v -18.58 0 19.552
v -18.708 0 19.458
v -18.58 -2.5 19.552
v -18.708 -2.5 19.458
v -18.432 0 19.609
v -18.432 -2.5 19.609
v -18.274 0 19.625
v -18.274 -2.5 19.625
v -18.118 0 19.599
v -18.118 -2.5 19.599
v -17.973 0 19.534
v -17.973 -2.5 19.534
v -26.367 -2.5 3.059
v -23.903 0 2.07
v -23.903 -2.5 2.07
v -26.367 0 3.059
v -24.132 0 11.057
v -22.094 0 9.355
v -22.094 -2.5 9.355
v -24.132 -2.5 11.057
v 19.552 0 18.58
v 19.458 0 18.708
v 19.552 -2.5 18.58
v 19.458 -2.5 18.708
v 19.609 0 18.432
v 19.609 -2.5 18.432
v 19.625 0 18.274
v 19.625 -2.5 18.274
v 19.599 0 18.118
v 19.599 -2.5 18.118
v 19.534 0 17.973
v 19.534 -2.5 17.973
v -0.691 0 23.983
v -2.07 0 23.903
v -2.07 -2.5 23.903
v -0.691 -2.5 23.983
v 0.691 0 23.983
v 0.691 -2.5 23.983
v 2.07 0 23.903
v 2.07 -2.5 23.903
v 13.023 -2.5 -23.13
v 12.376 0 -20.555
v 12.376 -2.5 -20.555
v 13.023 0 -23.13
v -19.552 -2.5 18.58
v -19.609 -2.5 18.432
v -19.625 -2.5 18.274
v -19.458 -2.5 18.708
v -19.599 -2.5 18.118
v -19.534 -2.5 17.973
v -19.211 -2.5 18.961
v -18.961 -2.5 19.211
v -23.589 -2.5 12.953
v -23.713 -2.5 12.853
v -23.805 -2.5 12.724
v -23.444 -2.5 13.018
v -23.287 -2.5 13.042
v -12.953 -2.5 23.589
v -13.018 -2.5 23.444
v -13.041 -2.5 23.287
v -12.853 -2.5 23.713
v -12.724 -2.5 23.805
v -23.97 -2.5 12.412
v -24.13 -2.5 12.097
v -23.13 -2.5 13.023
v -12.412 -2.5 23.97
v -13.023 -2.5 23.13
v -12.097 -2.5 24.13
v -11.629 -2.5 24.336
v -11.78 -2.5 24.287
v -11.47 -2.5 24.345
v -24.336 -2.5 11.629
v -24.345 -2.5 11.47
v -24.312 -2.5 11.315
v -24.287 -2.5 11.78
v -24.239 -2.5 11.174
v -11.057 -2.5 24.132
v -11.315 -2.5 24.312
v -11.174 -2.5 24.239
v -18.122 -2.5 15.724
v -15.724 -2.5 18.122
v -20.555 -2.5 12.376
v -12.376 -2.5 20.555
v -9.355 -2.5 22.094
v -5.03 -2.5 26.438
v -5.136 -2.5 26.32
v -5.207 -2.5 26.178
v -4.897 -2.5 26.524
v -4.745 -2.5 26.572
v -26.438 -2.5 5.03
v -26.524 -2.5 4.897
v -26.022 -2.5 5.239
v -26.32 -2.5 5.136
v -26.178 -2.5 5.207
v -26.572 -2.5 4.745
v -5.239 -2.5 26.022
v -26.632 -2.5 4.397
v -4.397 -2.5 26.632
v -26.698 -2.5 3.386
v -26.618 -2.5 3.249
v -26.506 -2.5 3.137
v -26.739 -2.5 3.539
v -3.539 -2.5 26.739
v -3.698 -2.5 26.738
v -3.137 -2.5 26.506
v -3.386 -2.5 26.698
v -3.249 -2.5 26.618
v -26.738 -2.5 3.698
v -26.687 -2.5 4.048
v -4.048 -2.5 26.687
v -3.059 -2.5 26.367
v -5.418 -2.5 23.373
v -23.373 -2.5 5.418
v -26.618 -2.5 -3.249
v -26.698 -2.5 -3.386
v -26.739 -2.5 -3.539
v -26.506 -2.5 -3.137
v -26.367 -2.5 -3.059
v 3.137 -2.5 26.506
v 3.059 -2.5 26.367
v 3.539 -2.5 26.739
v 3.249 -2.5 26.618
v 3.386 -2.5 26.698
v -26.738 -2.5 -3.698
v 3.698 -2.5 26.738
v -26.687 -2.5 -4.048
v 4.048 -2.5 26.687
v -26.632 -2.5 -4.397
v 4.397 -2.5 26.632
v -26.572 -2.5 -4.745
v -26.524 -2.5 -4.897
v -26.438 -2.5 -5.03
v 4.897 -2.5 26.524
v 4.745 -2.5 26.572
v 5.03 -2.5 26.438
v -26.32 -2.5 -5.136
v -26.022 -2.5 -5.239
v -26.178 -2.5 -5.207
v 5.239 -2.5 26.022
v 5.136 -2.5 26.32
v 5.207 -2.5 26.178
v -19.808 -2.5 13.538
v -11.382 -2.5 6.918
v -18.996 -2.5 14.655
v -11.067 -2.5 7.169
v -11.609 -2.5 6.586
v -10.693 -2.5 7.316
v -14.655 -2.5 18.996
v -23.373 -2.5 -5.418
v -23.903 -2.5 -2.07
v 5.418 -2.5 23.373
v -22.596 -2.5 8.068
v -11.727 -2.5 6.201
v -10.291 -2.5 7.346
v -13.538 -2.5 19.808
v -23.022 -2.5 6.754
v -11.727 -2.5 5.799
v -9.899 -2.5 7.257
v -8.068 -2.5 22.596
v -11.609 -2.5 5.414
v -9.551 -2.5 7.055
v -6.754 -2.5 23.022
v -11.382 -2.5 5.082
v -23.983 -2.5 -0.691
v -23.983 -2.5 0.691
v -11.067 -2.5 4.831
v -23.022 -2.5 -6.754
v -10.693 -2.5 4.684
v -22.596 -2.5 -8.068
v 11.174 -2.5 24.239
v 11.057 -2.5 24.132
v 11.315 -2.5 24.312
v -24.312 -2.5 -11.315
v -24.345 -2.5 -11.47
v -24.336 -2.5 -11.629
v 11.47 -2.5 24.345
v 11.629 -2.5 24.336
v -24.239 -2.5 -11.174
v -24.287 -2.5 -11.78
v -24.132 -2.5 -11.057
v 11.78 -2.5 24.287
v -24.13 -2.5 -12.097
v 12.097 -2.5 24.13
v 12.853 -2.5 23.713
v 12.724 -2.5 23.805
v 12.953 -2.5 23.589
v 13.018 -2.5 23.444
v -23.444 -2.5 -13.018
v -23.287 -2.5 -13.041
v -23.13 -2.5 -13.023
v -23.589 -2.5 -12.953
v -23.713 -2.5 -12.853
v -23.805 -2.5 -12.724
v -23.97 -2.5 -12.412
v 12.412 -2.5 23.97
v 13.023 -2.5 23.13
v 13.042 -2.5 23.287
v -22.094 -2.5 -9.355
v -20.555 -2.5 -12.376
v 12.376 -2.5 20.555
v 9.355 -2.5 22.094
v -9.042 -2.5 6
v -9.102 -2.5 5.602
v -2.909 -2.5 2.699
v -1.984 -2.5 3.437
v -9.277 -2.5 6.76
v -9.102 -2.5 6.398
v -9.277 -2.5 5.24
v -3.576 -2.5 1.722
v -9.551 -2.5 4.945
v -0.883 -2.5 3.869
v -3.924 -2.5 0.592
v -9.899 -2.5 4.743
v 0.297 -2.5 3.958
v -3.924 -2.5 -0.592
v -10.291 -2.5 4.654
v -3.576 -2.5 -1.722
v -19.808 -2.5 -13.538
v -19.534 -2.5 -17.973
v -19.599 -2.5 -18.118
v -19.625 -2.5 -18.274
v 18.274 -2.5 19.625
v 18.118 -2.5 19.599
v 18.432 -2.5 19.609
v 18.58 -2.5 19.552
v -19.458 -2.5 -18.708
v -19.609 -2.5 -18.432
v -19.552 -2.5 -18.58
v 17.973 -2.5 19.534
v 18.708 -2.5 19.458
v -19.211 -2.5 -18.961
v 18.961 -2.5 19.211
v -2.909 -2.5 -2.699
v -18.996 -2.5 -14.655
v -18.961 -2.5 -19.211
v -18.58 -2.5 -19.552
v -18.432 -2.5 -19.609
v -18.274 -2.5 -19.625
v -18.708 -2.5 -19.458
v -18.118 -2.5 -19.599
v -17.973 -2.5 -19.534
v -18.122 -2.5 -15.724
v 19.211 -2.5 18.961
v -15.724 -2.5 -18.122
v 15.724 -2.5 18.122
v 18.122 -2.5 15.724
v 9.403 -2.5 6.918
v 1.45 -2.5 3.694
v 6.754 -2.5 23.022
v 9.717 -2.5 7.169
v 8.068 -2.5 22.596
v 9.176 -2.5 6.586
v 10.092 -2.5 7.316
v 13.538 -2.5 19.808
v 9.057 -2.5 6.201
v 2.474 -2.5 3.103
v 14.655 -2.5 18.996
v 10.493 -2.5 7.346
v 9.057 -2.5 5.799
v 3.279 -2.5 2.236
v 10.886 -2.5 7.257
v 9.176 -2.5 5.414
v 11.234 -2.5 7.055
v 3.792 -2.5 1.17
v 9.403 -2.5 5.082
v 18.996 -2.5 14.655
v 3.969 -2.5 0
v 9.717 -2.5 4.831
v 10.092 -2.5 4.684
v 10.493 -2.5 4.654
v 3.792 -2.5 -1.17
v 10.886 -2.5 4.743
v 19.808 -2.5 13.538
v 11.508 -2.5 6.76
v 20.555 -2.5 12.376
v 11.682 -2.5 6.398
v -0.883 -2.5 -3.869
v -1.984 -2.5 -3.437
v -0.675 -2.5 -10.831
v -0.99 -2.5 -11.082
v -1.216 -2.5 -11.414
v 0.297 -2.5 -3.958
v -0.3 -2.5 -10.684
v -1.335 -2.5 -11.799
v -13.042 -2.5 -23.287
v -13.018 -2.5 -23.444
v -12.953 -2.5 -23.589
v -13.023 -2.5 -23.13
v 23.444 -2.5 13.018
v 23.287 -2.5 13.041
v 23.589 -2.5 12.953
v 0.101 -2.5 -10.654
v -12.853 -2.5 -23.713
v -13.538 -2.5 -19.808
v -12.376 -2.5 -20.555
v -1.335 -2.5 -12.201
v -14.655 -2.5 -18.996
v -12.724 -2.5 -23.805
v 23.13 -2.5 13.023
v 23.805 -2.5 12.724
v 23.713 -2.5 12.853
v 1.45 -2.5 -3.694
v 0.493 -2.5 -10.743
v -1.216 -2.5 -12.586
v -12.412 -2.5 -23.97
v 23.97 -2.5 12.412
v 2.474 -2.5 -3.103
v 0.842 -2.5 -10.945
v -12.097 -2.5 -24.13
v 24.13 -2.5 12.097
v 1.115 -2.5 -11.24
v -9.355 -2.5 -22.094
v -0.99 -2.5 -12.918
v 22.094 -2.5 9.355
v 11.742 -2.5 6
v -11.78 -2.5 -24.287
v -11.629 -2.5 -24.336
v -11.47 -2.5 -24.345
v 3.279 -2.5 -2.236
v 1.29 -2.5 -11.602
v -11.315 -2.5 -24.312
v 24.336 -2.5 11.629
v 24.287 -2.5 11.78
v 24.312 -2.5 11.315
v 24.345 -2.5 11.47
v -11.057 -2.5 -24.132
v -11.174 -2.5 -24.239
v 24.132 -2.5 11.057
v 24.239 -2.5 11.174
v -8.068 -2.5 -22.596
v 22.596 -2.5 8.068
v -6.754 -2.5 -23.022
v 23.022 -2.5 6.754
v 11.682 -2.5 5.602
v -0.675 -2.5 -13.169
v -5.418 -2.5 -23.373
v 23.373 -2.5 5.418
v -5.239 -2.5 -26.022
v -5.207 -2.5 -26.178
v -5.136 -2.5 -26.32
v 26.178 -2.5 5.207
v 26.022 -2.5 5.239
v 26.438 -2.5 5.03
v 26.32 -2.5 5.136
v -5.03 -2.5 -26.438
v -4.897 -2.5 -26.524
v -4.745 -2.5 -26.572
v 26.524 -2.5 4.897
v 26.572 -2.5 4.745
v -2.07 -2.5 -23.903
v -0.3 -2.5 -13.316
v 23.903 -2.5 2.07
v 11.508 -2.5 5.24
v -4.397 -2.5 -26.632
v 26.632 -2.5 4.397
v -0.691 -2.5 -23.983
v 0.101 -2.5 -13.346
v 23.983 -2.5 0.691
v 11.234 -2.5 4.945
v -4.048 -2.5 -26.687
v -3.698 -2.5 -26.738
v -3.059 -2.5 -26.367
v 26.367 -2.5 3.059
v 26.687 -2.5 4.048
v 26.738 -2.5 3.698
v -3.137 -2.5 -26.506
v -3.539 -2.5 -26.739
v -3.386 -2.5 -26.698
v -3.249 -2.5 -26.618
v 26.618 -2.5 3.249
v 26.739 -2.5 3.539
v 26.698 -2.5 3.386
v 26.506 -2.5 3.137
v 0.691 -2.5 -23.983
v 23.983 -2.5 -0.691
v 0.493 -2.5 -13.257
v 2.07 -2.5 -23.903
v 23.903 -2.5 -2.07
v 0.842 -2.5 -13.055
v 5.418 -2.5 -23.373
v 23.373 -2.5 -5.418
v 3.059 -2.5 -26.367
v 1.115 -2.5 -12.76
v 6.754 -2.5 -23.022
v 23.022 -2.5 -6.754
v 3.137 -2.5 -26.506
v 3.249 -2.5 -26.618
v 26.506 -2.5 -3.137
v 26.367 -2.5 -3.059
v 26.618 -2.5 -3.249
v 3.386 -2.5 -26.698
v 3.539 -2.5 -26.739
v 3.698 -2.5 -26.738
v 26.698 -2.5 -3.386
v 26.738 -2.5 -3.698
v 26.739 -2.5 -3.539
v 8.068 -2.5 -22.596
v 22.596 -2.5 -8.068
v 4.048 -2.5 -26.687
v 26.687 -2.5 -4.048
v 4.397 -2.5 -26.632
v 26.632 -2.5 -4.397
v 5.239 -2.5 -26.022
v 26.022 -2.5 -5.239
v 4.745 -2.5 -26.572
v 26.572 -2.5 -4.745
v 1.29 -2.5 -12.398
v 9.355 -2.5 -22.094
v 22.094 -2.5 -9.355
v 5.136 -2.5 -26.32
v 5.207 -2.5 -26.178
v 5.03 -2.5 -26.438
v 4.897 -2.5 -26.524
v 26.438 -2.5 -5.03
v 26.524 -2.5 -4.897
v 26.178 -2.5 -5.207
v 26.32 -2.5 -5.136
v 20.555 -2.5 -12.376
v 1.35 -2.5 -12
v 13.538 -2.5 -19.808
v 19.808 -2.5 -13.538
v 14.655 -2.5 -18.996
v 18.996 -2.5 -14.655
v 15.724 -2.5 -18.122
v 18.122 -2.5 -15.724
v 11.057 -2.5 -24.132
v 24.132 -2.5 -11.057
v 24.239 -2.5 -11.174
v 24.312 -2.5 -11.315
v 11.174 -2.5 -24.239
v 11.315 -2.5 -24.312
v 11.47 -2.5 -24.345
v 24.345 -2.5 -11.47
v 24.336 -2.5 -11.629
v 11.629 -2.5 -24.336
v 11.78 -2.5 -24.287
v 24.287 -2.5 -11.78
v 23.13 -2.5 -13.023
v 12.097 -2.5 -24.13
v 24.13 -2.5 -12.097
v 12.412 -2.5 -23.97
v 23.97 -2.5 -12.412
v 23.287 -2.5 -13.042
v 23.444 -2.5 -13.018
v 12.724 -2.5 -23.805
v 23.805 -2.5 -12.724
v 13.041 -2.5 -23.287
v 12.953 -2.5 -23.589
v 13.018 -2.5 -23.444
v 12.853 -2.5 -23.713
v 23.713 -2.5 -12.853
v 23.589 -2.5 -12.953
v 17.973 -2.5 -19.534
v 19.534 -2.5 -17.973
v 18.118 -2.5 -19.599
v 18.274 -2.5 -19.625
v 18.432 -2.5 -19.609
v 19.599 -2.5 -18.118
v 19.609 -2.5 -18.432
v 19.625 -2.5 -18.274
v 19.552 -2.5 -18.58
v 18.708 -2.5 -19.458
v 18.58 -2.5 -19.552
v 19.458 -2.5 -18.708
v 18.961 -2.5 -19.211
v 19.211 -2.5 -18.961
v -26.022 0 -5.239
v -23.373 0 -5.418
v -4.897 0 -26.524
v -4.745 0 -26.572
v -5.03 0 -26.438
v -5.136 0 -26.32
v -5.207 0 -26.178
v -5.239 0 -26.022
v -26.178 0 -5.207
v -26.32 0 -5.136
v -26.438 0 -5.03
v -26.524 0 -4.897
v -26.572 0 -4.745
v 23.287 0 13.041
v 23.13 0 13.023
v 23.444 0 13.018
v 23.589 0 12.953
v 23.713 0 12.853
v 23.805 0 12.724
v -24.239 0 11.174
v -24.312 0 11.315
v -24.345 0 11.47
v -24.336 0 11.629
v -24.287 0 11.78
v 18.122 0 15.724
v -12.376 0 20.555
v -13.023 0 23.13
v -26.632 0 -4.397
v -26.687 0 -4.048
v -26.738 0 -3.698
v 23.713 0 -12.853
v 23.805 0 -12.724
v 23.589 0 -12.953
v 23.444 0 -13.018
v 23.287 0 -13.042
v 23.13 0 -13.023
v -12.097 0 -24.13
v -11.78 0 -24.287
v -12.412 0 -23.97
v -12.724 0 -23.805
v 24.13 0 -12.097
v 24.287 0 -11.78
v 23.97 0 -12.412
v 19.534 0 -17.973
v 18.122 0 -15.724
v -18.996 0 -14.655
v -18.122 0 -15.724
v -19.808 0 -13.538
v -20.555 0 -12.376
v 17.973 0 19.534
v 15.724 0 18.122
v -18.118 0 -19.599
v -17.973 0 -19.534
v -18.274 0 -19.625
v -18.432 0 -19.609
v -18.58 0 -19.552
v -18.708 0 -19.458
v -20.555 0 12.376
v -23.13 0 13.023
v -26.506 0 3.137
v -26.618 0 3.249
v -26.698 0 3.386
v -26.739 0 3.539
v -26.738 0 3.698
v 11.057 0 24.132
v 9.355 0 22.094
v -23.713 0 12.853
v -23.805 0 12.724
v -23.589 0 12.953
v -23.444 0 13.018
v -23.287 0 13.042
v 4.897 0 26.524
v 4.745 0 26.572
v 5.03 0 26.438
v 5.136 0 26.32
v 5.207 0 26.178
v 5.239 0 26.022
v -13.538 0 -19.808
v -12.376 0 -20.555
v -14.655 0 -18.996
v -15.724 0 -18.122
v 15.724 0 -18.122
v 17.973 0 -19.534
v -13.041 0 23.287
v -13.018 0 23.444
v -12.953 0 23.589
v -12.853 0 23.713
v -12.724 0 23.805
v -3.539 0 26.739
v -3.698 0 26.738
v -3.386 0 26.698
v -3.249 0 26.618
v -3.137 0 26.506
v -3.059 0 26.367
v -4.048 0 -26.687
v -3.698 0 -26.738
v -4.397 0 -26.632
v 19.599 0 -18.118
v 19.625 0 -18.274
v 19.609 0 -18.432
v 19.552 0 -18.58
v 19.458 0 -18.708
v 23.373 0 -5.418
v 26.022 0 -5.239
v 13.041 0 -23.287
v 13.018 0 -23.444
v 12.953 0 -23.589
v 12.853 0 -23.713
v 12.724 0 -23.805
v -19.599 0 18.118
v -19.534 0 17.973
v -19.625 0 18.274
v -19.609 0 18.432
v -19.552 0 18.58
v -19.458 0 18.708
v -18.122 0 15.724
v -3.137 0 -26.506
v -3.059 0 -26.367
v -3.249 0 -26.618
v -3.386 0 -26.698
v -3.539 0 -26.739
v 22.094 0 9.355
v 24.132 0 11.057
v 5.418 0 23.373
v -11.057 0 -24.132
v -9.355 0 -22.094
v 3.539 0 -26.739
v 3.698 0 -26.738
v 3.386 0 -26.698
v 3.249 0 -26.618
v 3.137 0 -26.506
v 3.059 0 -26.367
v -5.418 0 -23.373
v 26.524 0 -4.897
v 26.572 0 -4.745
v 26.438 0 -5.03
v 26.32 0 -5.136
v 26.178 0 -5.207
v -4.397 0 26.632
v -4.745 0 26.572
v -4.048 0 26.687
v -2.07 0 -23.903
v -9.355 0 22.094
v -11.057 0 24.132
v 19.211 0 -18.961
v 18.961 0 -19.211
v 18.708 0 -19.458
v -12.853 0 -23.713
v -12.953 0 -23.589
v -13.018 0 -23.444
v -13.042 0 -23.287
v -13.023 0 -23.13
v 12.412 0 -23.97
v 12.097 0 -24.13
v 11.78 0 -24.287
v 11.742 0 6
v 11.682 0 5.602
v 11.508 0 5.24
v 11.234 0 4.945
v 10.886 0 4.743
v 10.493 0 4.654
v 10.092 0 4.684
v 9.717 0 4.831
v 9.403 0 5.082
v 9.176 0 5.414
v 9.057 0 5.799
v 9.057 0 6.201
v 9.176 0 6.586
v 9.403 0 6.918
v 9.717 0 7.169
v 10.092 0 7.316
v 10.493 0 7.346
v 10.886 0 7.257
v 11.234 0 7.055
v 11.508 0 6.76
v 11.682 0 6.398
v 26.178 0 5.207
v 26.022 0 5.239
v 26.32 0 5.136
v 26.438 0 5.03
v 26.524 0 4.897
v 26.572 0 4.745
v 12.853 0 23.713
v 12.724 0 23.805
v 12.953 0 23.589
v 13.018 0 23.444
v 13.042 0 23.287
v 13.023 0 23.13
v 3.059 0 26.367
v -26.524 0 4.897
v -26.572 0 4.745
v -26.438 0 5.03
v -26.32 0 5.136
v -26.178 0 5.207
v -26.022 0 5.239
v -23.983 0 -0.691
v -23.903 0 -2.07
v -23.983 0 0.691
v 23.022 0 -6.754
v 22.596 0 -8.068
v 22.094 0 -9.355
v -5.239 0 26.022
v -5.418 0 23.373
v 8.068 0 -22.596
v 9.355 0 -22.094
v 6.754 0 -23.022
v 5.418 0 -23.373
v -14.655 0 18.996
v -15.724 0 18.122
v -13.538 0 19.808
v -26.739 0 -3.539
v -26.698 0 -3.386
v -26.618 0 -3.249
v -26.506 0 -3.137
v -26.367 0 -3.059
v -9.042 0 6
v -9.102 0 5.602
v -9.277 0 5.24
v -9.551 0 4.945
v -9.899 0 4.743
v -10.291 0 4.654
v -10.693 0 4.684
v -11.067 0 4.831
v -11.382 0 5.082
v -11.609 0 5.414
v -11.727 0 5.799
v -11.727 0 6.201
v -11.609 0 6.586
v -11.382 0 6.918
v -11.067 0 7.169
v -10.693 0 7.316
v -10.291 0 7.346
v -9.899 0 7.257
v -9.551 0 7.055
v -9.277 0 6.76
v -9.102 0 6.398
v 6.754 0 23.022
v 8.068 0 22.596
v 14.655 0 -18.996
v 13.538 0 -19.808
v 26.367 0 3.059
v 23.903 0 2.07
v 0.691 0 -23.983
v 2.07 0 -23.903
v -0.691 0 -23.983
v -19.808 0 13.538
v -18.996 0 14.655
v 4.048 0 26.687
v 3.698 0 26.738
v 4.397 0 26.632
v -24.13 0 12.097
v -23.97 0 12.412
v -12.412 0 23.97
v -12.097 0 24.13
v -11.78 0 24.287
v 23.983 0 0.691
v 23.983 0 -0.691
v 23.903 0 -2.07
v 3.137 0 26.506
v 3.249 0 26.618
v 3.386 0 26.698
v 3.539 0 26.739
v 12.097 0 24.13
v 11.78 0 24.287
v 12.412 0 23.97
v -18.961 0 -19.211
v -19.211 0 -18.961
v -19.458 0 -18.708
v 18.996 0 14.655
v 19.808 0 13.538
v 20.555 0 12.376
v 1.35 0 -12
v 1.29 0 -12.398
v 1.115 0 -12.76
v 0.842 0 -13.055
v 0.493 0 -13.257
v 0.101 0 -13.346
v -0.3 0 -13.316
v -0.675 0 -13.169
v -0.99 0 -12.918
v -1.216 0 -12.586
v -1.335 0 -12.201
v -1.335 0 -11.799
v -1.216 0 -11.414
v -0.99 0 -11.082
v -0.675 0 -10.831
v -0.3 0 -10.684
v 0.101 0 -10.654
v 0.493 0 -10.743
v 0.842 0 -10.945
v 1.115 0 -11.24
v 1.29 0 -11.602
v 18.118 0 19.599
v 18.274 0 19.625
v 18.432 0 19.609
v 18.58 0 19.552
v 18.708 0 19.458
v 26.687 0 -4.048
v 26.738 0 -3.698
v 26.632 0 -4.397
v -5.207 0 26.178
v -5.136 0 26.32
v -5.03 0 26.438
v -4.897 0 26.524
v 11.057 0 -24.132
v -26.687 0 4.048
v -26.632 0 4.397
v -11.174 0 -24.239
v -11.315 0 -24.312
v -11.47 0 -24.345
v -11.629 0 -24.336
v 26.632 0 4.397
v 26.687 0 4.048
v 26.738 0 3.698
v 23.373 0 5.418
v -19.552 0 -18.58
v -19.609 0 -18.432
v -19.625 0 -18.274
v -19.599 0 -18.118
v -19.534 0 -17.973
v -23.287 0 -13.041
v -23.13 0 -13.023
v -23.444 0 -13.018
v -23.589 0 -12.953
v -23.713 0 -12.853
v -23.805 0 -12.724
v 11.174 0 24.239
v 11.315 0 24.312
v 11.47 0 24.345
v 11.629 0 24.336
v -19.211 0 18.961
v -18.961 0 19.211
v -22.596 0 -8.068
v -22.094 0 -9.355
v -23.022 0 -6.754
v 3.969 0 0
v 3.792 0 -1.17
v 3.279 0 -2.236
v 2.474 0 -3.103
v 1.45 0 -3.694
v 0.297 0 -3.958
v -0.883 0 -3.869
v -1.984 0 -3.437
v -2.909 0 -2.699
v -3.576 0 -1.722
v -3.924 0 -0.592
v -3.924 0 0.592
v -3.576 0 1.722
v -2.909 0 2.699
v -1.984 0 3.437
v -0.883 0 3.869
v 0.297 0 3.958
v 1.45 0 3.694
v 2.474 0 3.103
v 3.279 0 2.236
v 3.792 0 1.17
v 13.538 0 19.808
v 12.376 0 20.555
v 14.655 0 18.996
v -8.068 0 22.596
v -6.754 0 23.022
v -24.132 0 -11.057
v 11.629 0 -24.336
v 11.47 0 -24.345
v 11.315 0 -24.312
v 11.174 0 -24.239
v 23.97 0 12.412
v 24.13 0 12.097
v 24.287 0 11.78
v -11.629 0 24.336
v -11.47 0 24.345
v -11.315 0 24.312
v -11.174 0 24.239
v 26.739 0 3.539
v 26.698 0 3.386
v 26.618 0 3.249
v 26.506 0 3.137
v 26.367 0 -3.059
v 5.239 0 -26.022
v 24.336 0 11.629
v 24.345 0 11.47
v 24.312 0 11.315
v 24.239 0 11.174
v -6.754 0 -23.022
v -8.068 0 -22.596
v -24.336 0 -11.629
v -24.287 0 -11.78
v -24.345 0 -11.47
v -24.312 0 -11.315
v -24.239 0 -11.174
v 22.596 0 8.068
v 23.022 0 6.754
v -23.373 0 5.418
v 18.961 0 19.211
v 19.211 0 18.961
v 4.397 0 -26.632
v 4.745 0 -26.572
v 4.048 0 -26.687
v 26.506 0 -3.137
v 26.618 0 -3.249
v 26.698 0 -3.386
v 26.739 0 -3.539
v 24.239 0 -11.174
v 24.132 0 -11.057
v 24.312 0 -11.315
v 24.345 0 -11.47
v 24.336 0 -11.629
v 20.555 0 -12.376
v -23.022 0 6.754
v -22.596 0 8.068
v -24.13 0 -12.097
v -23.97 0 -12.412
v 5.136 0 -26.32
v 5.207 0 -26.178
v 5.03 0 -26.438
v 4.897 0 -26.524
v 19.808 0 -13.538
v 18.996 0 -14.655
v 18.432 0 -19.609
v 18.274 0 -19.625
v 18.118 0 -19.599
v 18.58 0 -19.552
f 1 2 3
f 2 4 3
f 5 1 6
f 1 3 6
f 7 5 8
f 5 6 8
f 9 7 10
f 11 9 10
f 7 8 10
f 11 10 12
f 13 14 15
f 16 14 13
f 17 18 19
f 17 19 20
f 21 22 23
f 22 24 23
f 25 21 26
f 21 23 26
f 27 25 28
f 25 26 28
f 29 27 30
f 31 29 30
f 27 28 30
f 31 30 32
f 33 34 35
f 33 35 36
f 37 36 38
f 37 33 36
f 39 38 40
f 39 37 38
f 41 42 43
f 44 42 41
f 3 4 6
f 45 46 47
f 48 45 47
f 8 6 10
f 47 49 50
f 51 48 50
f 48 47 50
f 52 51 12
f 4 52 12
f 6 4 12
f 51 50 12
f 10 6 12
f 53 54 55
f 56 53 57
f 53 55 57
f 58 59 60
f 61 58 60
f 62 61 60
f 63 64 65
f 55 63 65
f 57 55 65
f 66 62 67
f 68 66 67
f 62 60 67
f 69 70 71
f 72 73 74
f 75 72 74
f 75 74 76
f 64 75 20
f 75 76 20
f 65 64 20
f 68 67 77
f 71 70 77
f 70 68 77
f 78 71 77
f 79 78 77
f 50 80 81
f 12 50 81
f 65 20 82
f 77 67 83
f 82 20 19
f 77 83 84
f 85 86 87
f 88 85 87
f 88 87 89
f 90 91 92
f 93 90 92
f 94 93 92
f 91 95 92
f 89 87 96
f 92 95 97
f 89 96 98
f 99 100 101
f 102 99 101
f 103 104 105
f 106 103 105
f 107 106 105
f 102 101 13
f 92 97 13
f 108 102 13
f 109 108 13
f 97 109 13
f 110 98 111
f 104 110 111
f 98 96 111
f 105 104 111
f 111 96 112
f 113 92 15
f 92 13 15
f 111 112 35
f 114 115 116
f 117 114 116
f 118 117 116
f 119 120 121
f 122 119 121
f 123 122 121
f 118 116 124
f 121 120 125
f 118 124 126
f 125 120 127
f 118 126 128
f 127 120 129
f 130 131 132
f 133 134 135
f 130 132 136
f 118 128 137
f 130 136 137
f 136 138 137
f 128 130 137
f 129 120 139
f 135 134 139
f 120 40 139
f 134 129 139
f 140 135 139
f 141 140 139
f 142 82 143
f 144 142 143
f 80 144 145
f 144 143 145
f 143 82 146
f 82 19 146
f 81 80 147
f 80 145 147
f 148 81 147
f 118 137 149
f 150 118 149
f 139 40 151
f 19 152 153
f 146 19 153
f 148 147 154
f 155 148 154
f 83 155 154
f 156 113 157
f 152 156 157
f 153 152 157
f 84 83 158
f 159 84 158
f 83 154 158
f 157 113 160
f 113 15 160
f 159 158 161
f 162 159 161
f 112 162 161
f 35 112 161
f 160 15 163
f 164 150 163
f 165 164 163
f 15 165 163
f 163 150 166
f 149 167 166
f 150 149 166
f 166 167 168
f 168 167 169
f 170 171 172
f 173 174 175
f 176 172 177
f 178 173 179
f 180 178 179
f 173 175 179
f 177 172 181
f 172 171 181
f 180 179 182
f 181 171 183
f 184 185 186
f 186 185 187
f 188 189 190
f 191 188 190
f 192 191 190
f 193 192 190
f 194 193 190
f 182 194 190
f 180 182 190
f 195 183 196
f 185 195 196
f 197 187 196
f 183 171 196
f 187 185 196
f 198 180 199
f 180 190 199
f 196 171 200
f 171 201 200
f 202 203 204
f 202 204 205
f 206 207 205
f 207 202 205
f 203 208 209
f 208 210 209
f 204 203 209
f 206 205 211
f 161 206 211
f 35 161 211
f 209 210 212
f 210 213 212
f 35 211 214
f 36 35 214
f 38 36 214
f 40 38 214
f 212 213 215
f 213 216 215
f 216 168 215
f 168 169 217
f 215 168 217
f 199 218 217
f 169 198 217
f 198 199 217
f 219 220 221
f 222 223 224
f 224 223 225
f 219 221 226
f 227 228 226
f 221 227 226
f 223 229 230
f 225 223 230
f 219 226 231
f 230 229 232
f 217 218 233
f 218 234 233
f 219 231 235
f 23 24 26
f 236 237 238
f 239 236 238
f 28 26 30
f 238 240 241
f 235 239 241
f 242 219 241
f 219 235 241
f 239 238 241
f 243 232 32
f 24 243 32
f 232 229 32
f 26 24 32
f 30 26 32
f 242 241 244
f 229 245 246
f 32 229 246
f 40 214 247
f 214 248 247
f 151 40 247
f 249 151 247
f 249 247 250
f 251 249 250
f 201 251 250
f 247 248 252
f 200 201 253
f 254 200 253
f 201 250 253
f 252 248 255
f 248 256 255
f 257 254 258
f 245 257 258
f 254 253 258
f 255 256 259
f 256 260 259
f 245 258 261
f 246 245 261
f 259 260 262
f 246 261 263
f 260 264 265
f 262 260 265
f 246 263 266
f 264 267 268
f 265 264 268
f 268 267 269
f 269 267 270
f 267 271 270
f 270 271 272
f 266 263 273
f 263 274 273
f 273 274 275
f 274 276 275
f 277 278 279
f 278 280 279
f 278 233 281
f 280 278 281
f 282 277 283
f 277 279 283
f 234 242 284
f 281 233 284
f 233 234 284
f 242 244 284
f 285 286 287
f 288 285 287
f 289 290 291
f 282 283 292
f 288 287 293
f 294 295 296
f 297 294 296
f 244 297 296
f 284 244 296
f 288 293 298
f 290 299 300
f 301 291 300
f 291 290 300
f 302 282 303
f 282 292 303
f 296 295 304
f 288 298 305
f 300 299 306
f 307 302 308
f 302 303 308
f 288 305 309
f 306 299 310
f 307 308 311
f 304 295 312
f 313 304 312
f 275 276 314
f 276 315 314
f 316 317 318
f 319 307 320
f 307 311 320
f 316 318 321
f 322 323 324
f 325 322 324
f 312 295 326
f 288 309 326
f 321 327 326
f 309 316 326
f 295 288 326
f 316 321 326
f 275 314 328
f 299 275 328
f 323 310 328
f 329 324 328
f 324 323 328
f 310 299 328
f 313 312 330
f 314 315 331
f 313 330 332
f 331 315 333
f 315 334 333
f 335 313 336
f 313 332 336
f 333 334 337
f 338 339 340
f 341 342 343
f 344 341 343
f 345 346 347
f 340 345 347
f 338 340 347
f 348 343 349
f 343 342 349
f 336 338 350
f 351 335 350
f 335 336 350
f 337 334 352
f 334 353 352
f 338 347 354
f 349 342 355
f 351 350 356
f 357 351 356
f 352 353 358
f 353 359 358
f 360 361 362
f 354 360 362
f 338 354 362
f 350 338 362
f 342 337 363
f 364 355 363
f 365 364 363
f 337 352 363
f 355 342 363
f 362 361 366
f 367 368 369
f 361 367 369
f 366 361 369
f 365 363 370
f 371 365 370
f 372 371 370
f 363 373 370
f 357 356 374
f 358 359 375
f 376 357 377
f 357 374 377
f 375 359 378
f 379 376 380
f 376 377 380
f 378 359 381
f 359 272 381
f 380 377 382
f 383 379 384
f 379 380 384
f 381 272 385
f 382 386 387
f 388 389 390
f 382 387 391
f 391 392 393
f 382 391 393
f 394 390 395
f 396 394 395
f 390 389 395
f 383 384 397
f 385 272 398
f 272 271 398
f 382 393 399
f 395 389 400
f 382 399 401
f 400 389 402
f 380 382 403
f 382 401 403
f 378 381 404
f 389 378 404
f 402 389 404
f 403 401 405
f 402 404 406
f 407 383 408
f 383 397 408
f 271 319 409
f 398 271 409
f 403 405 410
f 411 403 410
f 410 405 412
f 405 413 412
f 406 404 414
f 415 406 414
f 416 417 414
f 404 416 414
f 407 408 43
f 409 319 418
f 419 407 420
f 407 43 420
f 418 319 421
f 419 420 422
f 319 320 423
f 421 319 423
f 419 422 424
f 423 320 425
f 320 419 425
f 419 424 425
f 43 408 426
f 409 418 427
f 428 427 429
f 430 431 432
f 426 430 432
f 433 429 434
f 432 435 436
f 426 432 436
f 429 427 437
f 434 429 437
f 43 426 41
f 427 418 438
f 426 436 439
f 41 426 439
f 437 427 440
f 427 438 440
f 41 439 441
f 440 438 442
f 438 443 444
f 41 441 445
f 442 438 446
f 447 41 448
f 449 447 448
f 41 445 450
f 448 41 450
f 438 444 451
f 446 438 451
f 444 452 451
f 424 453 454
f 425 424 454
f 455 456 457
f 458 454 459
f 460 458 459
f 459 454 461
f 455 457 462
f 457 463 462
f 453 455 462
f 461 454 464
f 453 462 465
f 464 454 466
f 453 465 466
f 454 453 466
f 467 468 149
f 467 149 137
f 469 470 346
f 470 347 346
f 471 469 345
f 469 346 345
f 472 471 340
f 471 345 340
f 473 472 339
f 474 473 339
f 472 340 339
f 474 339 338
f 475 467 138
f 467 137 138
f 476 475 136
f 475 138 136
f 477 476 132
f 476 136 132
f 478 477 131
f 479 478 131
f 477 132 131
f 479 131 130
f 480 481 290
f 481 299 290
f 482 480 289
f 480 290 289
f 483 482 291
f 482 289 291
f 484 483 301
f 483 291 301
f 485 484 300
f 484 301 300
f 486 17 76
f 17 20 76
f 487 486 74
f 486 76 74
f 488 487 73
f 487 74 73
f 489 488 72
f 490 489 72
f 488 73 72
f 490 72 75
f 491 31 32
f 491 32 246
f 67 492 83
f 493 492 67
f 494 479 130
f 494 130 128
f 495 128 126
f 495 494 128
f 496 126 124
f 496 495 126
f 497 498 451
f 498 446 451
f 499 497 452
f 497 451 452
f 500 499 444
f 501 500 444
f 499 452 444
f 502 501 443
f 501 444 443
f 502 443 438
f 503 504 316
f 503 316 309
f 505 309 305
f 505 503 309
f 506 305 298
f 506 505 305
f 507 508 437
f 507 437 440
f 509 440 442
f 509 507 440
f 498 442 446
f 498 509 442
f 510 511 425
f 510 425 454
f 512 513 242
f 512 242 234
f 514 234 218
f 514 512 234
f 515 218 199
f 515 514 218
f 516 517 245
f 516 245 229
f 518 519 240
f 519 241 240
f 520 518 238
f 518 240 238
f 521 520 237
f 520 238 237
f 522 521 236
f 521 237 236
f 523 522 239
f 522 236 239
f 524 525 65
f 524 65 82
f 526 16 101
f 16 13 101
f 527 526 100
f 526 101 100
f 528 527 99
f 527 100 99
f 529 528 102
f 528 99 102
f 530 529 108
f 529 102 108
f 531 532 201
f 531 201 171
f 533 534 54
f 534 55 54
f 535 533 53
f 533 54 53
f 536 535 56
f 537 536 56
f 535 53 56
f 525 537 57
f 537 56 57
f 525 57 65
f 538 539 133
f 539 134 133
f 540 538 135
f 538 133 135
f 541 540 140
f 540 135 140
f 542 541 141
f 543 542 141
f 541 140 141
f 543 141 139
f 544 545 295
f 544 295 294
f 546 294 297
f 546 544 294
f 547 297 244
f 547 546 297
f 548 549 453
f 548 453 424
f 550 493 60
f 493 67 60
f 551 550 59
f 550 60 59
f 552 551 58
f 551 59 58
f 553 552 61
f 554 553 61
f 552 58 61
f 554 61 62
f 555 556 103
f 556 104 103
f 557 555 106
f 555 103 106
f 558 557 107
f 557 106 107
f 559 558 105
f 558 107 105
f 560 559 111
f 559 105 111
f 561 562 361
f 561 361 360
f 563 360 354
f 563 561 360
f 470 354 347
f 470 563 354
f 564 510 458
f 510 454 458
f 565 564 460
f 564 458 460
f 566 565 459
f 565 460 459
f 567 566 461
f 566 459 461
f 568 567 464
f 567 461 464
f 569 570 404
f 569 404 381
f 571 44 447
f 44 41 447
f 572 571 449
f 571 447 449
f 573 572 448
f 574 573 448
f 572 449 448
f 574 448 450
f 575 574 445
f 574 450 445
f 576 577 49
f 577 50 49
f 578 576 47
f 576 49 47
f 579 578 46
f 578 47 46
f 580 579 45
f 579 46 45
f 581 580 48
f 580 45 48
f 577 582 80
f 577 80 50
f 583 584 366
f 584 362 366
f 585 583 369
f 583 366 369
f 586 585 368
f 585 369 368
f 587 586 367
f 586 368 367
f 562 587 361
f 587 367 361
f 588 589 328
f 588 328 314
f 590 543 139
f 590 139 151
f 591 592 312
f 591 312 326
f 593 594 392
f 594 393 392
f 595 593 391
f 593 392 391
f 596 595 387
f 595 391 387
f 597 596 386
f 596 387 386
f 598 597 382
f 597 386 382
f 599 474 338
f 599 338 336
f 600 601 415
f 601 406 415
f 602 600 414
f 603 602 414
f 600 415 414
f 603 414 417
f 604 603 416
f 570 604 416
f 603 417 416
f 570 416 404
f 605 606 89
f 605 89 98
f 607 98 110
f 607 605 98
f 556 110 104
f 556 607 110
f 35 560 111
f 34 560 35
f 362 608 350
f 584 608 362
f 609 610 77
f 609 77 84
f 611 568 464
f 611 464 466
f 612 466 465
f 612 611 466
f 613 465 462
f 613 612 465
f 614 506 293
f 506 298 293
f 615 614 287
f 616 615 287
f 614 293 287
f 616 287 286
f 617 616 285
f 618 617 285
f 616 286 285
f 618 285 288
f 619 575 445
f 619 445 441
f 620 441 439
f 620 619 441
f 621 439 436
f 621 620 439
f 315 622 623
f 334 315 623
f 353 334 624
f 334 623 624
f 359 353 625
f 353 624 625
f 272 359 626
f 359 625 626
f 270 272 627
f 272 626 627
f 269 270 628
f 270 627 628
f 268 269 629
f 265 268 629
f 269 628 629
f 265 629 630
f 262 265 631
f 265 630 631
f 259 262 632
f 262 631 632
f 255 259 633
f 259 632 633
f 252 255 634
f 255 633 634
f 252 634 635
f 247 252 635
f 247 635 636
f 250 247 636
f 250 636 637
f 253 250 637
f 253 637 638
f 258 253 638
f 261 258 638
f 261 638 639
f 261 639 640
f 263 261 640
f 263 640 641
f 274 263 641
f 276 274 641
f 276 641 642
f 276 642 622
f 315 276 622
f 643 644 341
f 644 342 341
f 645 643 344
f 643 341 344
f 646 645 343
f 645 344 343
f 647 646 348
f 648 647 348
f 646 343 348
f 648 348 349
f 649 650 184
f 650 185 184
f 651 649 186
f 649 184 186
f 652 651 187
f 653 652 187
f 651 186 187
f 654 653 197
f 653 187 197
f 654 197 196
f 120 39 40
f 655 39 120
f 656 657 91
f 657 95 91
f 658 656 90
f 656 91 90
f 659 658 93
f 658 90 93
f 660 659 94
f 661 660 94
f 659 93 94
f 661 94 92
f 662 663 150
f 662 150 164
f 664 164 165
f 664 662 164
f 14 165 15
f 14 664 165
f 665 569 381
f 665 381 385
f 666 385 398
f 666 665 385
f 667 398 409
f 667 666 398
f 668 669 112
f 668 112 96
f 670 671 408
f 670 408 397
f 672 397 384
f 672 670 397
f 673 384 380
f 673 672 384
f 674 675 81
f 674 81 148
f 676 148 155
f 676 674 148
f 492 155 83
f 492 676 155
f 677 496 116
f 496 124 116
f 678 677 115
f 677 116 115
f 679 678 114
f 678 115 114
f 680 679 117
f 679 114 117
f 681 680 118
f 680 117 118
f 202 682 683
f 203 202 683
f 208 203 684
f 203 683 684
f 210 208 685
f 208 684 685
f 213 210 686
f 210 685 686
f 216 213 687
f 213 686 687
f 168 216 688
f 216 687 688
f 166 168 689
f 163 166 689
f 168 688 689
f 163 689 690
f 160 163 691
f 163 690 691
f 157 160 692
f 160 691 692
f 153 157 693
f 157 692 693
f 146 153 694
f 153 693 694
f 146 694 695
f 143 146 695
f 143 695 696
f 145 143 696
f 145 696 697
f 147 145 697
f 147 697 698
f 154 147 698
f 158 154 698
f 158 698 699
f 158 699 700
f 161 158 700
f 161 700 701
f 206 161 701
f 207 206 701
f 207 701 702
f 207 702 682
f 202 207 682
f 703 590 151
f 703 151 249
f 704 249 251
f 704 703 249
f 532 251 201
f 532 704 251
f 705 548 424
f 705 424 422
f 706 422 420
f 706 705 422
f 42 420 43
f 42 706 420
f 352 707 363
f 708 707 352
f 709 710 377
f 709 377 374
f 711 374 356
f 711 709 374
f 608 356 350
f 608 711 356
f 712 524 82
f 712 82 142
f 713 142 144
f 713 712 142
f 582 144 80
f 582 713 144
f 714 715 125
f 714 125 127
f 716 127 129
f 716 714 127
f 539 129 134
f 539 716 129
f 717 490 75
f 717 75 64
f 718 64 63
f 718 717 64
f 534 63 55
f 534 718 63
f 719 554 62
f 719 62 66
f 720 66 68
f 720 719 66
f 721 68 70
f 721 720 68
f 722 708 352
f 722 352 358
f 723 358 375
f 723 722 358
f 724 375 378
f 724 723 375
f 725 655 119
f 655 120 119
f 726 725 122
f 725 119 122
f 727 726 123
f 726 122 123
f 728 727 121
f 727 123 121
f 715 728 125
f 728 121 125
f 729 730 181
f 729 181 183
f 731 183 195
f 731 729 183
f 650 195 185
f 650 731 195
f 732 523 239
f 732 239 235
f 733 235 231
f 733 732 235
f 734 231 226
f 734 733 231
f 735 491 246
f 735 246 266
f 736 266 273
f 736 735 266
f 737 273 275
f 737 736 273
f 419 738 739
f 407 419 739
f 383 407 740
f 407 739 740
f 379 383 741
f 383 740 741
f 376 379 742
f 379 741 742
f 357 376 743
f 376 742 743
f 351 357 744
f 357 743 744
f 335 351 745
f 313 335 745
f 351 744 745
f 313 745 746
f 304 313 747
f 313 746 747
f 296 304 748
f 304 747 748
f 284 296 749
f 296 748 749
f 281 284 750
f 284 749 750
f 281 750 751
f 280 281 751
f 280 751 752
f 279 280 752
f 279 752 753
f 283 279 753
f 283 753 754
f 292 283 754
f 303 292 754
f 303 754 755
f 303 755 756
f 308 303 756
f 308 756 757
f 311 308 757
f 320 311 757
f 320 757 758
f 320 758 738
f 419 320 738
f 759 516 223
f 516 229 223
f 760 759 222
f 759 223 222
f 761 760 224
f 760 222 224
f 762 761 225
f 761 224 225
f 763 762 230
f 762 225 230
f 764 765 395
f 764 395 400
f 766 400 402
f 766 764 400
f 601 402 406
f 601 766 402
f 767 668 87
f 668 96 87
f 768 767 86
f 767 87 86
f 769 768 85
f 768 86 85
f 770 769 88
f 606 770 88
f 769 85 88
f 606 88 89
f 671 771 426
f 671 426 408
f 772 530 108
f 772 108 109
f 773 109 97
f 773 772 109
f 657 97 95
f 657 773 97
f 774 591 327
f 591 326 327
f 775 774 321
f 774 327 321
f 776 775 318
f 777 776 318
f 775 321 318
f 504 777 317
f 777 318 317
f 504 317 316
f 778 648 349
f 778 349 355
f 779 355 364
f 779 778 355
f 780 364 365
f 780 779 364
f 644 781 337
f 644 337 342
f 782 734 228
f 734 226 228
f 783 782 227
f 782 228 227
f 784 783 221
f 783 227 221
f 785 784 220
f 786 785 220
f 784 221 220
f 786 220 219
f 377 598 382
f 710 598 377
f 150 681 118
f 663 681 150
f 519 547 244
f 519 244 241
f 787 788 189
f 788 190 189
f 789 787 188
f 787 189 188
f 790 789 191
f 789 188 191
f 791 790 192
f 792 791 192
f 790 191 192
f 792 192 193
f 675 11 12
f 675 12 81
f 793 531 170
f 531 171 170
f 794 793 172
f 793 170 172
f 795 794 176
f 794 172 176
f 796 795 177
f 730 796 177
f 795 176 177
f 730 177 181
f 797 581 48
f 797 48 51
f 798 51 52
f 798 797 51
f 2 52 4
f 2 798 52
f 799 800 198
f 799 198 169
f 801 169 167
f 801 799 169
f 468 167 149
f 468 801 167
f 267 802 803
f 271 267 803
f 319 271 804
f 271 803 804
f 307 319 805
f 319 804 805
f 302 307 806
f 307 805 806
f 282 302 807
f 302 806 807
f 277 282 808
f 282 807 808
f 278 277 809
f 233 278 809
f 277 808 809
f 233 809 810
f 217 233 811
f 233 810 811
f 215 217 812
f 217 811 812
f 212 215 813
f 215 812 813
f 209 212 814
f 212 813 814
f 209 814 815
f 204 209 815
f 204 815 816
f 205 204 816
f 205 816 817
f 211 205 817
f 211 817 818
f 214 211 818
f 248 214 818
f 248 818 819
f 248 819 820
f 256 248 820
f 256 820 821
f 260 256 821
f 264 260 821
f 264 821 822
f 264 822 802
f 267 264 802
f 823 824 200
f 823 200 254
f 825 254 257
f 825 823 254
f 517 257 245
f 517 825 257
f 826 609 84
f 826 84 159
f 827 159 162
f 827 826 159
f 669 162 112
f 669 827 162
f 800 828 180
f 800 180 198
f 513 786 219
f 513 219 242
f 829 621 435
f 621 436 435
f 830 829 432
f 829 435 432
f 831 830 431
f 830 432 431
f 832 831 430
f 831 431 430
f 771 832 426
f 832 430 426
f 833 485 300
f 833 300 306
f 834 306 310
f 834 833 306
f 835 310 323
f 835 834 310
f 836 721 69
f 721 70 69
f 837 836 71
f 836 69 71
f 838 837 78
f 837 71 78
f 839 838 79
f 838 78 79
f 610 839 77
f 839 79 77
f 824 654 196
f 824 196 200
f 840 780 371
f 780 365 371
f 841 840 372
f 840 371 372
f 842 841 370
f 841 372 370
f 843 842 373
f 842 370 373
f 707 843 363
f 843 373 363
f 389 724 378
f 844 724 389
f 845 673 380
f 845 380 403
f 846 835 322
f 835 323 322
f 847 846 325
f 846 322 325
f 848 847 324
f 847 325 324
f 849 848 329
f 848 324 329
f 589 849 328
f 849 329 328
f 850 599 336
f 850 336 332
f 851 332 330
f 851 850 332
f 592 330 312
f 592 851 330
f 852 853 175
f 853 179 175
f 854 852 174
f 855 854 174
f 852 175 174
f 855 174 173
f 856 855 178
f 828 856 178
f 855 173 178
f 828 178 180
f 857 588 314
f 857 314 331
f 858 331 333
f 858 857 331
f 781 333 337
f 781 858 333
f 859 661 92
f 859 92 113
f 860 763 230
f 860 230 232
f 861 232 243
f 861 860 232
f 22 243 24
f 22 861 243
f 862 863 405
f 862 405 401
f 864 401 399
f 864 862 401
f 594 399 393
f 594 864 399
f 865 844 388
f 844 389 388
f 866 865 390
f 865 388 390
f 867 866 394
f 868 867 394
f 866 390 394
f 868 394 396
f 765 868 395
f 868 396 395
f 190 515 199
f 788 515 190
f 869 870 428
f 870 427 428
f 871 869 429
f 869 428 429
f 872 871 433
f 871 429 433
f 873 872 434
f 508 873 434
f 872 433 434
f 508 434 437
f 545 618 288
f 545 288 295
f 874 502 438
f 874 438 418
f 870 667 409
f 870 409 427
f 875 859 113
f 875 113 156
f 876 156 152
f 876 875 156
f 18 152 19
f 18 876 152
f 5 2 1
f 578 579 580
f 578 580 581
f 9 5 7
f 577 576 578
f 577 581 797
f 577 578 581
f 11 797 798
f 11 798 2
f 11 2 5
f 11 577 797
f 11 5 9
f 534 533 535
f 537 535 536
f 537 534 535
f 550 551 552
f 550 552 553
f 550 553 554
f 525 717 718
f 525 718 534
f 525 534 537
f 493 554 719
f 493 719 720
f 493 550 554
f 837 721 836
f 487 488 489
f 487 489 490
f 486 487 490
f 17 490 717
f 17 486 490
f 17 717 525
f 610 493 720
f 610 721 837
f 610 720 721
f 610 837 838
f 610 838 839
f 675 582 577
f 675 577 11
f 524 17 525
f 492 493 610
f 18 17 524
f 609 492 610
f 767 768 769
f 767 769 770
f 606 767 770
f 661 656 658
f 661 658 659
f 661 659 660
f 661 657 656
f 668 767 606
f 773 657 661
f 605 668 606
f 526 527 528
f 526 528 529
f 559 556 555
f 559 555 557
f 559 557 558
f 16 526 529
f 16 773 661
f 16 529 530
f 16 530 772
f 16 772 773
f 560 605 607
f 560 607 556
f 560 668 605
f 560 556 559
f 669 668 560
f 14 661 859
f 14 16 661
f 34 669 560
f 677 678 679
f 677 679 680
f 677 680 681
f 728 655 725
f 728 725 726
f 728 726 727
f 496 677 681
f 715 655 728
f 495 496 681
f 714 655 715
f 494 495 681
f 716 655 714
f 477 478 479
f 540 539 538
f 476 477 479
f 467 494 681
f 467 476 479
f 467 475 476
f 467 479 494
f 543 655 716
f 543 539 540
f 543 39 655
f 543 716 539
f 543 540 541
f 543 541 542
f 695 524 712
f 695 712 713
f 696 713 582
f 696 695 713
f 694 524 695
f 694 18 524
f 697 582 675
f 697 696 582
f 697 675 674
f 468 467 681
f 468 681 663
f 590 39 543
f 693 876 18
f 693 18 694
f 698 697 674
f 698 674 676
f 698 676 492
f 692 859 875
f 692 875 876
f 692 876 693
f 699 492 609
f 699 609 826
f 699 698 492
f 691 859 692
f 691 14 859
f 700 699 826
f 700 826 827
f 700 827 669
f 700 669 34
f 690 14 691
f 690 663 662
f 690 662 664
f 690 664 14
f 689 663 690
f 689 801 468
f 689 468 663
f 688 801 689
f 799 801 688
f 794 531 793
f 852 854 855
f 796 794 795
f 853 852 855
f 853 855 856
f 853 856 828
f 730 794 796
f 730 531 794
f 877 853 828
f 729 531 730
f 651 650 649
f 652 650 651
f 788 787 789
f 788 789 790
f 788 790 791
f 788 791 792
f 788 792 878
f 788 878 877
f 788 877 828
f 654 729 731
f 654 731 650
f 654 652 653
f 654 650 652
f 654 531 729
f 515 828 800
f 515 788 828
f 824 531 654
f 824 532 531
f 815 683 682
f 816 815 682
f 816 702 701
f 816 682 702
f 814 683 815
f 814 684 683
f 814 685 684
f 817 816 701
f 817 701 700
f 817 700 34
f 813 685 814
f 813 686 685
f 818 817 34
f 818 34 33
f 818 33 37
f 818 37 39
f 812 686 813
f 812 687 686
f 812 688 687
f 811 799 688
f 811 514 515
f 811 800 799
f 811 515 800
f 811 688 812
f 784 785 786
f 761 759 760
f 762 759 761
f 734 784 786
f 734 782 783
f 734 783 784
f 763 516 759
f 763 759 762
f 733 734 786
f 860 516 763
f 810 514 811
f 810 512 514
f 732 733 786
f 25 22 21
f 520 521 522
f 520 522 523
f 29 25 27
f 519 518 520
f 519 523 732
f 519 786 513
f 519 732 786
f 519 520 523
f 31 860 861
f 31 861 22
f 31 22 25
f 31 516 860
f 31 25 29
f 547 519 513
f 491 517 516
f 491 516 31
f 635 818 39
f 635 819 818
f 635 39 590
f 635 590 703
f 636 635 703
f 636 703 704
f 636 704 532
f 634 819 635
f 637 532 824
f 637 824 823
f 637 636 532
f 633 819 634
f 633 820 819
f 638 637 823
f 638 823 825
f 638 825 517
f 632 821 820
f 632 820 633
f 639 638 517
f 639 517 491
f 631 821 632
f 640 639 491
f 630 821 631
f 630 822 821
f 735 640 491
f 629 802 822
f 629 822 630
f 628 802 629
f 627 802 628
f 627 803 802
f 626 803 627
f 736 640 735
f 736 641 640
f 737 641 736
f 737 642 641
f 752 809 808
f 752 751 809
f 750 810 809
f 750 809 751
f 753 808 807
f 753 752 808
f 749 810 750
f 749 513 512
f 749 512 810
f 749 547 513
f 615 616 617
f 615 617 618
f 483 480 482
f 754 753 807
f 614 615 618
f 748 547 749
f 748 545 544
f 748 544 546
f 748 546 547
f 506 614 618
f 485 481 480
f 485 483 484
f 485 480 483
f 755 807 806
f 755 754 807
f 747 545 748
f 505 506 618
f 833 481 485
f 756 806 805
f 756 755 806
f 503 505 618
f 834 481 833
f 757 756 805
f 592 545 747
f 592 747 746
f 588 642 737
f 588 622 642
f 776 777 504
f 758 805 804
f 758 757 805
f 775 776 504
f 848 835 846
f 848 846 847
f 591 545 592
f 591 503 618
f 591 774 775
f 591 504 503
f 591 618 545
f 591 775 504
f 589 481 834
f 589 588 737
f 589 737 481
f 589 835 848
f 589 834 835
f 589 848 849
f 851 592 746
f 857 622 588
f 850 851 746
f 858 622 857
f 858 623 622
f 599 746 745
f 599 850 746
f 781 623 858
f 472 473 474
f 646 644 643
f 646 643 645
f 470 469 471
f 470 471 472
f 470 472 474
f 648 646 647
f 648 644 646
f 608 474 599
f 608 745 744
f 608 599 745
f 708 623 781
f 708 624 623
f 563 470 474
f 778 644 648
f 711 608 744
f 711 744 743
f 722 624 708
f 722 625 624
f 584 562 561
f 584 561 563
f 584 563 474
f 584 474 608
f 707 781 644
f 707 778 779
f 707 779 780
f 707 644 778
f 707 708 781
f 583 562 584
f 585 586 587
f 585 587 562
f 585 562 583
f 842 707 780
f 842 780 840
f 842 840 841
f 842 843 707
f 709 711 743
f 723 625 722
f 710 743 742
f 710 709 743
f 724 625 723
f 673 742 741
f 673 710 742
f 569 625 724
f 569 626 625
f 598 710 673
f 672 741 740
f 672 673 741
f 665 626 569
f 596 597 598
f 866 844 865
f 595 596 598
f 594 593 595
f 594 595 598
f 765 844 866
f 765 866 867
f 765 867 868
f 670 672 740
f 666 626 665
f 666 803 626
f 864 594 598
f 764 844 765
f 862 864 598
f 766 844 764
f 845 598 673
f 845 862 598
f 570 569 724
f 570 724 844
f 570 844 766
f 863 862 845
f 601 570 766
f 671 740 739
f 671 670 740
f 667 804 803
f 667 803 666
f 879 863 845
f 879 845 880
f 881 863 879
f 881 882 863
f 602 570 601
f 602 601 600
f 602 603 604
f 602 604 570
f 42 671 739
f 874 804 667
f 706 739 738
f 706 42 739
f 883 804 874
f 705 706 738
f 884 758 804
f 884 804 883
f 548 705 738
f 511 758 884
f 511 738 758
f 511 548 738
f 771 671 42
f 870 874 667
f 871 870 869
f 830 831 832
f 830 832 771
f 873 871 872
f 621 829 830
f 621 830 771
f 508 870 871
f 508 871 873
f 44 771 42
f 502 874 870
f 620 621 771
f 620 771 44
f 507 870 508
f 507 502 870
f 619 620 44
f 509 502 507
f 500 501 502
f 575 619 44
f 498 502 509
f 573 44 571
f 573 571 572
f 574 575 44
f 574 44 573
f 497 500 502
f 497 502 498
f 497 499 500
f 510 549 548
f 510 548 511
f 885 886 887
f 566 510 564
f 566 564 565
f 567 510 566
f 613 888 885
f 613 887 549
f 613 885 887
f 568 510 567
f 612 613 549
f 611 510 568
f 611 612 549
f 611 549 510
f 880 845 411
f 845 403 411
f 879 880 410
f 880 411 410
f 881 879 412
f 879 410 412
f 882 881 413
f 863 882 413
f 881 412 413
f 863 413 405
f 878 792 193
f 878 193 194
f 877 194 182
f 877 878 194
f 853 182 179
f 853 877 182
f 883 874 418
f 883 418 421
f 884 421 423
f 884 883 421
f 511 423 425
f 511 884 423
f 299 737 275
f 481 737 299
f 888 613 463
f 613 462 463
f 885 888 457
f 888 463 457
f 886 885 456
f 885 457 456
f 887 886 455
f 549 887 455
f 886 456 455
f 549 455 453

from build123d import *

# Parameters (mm, degrees)
BOSS_EXTRUDE1_DEPTH = 2.5
FILLET1_R           = 0.6
SKETCH5_R           = 1.35
CUT_EXTRUDE4_DEPTH  = 3.5
SKETCH6_R           = 3.96875
CUT_EXTRUDE5_DEPTH  = 3.5


with BuildPart() as part:
    # Sketch1 → Boss-Extrude1 (new body)
    with BuildSketch(Plane(origin=(0, 0, 0), x_dir=(1, 0, 0), z_dir=(0, 1, 0))):
        with BuildLine():
            Line((-2.069685574, 23.903244449), (-3.232226288, 26.798460531))
            ThreePointArc((-3.232226288, 26.798460531), (-4.222590109, 26.66035458), (-5.207159099, 26.485661549))
            Line((-5.207159099, 26.485661549), (-5.418128963, 23.372902518))
            ThreePointArc((-5.418128963, 23.372902518), (-7.414149843, 22.818393363), (-9.354896707, 22.093768379))
            Line((-9.354896707, 22.093768379), (-11.3552096, 24.488037662))
            ThreePointArc((-11.3552096, 24.488037662), (-12.25442448, 24.050651847), (-13.136822119, 23.580260351))
            Line((-13.136822119, 23.580260351), (-12.375570942, 20.554657318))
            ThreePointArc((-12.375570942, 20.554657318), (-14.102546855, 19.410483399), (-15.724385372, 18.121600323))
            Line((-15.724385372, 18.121600323), (-18.36666588, 19.780555048))
            ThreePointArc((-18.36666588, 19.780555048), (-19.086710402, 19.086703739), (-19.78056146, 18.366658976))
            Line((-19.78056146, 18.366658976), (-18.121605812, 15.724379046))
            ThreePointArc((-18.121605812, 15.724379046), (-19.410488322, 14.102540079), (-20.554661637, 12.375563767))
            Line((-20.554661637, 12.375563767), (-23.580264936, 13.136813888))
            ThreePointArc((-23.580264936, 13.136813888), (-24.050656124, 12.254416085), (-24.488041625, 11.355201052))
            Line((-24.488041625, 11.355201052), (-22.093771644, 9.354888995))
            ThreePointArc((-22.093771644, 9.354888995), (-22.818395951, 7.414141878), (-23.37290441, 5.418120804))
            Line((-23.37290441, 5.418120804), (-26.485663367, 5.207149854))
            ThreePointArc((-26.485663367, 5.207149854), (-26.660356054, 4.222580803), (-26.798461659, 3.232216933))
            Line((-26.798461659, 3.232216933), (-23.903245172, 2.06967723))
            ThreePointArc((-23.903245172, 2.06967723), (-23.99268, -4.188e-06), (-23.903244449, -2.069685574))
            Line((-23.903244449, -2.069685574), (-26.798460531, -3.232226288))
            ThreePointArc((-26.798460531, -3.232226288), (-26.66035458, -4.222590109), (-26.485661549, -5.207159099))
            Line((-26.485661549, -5.207159099), (-23.372902518, -5.418128963))
            ThreePointArc((-23.372902518, -5.418128963), (-22.818393363, -7.414149843), (-22.093768379, -9.354896707))
            Line((-22.093768379, -9.354896707), (-24.488037662, -11.3552096))
            ThreePointArc((-24.488037662, -11.3552096), (-24.050651847, -12.25442448), (-23.580260351, -13.136822119))
            Line((-23.580260351, -13.136822119), (-20.554657318, -12.375570942))
            ThreePointArc((-20.554657318, -12.375570942), (-19.410483399, -14.102546855), (-18.121600323, -15.724385372))
            Line((-18.121600323, -15.724385372), (-19.780555048, -18.36666588))
            ThreePointArc((-19.780555048, -18.36666588), (-19.086703739, -19.086710402), (-18.366658976, -19.78056146))
            Line((-18.366658976, -19.78056146), (-15.724379046, -18.121605812))
            ThreePointArc((-15.724379046, -18.121605812), (-14.102540079, -19.410488322), (-12.375563767, -20.554661637))
            Line((-12.375563767, -20.554661637), (-13.136813888, -23.580264936))
            ThreePointArc((-13.136813888, -23.580264936), (-12.254416085, -24.050656124), (-11.355201052, -24.488041625))
            Line((-11.355201052, -24.488041625), (-9.354888995, -22.093771644))
            ThreePointArc((-9.354888995, -22.093771644), (-7.414141878, -22.818395951), (-5.418120804, -23.37290441))
            Line((-5.418120804, -23.37290441), (-5.207149854, -26.485663367))
            ThreePointArc((-5.207149854, -26.485663367), (-4.222580803, -26.660356054), (-3.232216933, -26.798461659))
            Line((-3.232216933, -26.798461659), (-2.06967723, -23.903245172))
            ThreePointArc((-2.06967723, -23.903245172), (4.188e-06, -23.99268), (2.069685574, -23.903244449))
            Line((2.069685574, -23.903244449), (3.232226288, -26.798460531))
            ThreePointArc((3.232226288, -26.798460531), (4.222590109, -26.66035458), (5.207159099, -26.485661549))
            Line((5.207159099, -26.485661549), (5.418128963, -23.372902518))
            ThreePointArc((5.418128963, -23.372902518), (7.414149843, -22.818393363), (9.354896707, -22.093768379))
            Line((9.354896707, -22.093768379), (11.3552096, -24.488037662))
            ThreePointArc((11.3552096, -24.488037662), (12.25442448, -24.050651847), (13.136822119, -23.580260351))
            Line((13.136822119, -23.580260351), (12.375570942, -20.554657318))
            ThreePointArc((12.375570942, -20.554657318), (14.102546855, -19.410483399), (15.724385372, -18.121600323))
            Line((15.724385372, -18.121600323), (18.36666588, -19.780555048))
            ThreePointArc((18.36666588, -19.780555048), (19.086710402, -19.086703739), (19.78056146, -18.366658976))
            Line((19.78056146, -18.366658976), (18.121605812, -15.724379046))
            ThreePointArc((18.121605812, -15.724379046), (19.410488322, -14.102540079), (20.554661637, -12.375563767))
            Line((20.554661637, -12.375563767), (23.580264936, -13.136813888))
            ThreePointArc((23.580264936, -13.136813888), (24.050656124, -12.254416085), (24.488041625, -11.355201052))
            Line((24.488041625, -11.355201052), (22.093771644, -9.354888995))
            ThreePointArc((22.093771644, -9.354888995), (22.818395951, -7.414141878), (23.37290441, -5.418120804))
            Line((23.37290441, -5.418120804), (26.485663367, -5.207149854))
            ThreePointArc((26.485663367, -5.207149854), (26.660356054, -4.222580803), (26.798461659, -3.232216933))
            Line((26.798461659, -3.232216933), (23.903245172, -2.06967723))
            ThreePointArc((23.903245172, -2.06967723), (23.99268, 4.188e-06), (23.903244449, 2.069685574))
            Line((23.903244449, 2.069685574), (26.798460531, 3.232226288))
            ThreePointArc((26.798460531, 3.232226288), (26.66035458, 4.222590109), (26.485661549, 5.207159099))
            Line((26.485661549, 5.207159099), (23.372902518, 5.418128963))
            ThreePointArc((23.372902518, 5.418128963), (22.818393363, 7.414149843), (22.093768379, 9.354896707))
            Line((22.093768379, 9.354896707), (24.488037662, 11.3552096))
            ThreePointArc((24.488037662, 11.3552096), (24.050651847, 12.25442448), (23.580260351, 13.136822119))
            Line((23.580260351, 13.136822119), (20.554657318, 12.375570942))
            ThreePointArc((20.554657318, 12.375570942), (19.410483399, 14.102546855), (18.121600323, 15.724385372))
            Line((18.121600323, 15.724385372), (19.780555048, 18.36666588))
            ThreePointArc((19.780555048, 18.36666588), (19.086703739, 19.086710402), (18.366658976, 19.78056146))
            Line((18.366658976, 19.78056146), (15.724379046, 18.121605812))
            ThreePointArc((15.724379046, 18.121605812), (14.102540079, 19.410488322), (12.375563767, 20.554661637))
            Line((12.375563767, 20.554661637), (13.136813888, 23.580264936))
            ThreePointArc((13.136813888, 23.580264936), (12.254416085, 24.050656124), (11.355201052, 24.488041625))
            Line((11.355201052, 24.488041625), (9.354888995, 22.093771644))
            ThreePointArc((9.354888995, 22.093771644), (7.414141878, 22.818395951), (5.418120804, 23.37290441))
            Line((5.418120804, 23.37290441), (5.207149854, 26.485663367))
            ThreePointArc((5.207149854, 26.485663367), (4.222580803, 26.660356054), (3.232216933, 26.798461659))
            Line((3.232216933, 26.798461659), (2.06967723, 23.903245172))
            ThreePointArc((2.06967723, 23.903245172), (-4.188e-06, 23.99268), (-2.069685574, 23.903244449))
        make_face()
    extrude(amount=-BOSS_EXTRUDE1_DEPTH)

    # Fillet1
    fillet1_edges = [part.edges().sort_by_distance(p)[0] for p in [
        (3.232216933, -1.25, -26.798461659),
        (5.207149854, -1.25, -26.485663367),
        (11.355201052, -1.25, -24.488041625),
        (13.136813888, -1.25, -23.580264936),
        (18.366658976, -1.25, -19.78056146),
        (19.780555048, -1.25, -18.36666588),
        (23.580260351, -1.25, -13.136822119),
        (24.488037662, -1.25, -11.3552096),
        (26.485661549, -1.25, -5.207159099),
        (26.798460531, -1.25, -3.232226288),
        (26.798461659, -1.25, 3.232216933),
        (26.485663367, -1.25, 5.207149854),
        (24.488041625, -1.25, 11.355201052),
        (23.580264936, -1.25, 13.136813888),
        (19.78056146, -1.25, 18.366658976),
        (18.36666588, -1.25, 19.780555048),
        (13.136822119, -1.25, 23.580260351),
        (11.3552096, -1.25, 24.488037662),
        (5.207159099, -1.25, 26.485661549),
        (3.232226288, -1.25, 26.798460531),
        (-3.232216933, -1.25, 26.798461659),
        (-5.207149854, -1.25, 26.485663367),
        (-11.355201052, -1.25, 24.488041625),
        (-13.136813888, -1.25, 23.580264936),
        (-18.366658976, -1.25, 19.78056146),
        (-19.780555048, -1.25, 18.36666588),
        (-23.580260351, -1.25, 13.136822119),
        (-24.488037662, -1.25, 11.3552096),
        (-26.485661549, -1.25, 5.207159099),
        (-26.798460531, -1.25, 3.232226288),
        (-26.798461659, -1.25, -3.232216933),
        (-26.485663367, -1.25, -5.207149854),
        (-24.488041625, -1.25, -11.355201052),
        (-23.580264936, -1.25, -13.136813888),
        (-19.78056146, -1.25, -18.366658976),
        (-18.36666588, -1.25, -19.780555048),
        (-13.136822119, -1.25, -23.580260351),
        (-11.3552096, -1.25, -24.488037662),
        (-5.207159099, -1.25, -26.485661549),
        (-3.232226288, -1.25, -26.798460531),
    ]]
    fillet(fillet1_edges, radius=FILLET1_R)

    # Sketch5 → Cut-Extrude4 (cut, through all)
    with BuildSketch(Plane(origin=(0, 0, 0), x_dir=(1, 0, 0), z_dir=(0, 1, 0))):
        with Locations((0, 12)):
            Circle(SKETCH5_R)
        with Locations((10.392304845, -6)):
            Circle(SKETCH5_R)
        with Locations((-10.392304845, -6)):
            Circle(SKETCH5_R)
    extrude(amount=-CUT_EXTRUDE4_DEPTH, mode=Mode.SUBTRACT)

    # Sketch6 → Cut-Extrude5 (cut, through all)
    with BuildSketch(Plane(origin=(0, 0, 0), x_dir=(1, 0, 0), z_dir=(0, 1, 0))):
        Circle(SKETCH6_R)
    extrude(amount=-CUT_EXTRUDE5_DEPTH, mode=Mode.SUBTRACT)


solid = part.part
